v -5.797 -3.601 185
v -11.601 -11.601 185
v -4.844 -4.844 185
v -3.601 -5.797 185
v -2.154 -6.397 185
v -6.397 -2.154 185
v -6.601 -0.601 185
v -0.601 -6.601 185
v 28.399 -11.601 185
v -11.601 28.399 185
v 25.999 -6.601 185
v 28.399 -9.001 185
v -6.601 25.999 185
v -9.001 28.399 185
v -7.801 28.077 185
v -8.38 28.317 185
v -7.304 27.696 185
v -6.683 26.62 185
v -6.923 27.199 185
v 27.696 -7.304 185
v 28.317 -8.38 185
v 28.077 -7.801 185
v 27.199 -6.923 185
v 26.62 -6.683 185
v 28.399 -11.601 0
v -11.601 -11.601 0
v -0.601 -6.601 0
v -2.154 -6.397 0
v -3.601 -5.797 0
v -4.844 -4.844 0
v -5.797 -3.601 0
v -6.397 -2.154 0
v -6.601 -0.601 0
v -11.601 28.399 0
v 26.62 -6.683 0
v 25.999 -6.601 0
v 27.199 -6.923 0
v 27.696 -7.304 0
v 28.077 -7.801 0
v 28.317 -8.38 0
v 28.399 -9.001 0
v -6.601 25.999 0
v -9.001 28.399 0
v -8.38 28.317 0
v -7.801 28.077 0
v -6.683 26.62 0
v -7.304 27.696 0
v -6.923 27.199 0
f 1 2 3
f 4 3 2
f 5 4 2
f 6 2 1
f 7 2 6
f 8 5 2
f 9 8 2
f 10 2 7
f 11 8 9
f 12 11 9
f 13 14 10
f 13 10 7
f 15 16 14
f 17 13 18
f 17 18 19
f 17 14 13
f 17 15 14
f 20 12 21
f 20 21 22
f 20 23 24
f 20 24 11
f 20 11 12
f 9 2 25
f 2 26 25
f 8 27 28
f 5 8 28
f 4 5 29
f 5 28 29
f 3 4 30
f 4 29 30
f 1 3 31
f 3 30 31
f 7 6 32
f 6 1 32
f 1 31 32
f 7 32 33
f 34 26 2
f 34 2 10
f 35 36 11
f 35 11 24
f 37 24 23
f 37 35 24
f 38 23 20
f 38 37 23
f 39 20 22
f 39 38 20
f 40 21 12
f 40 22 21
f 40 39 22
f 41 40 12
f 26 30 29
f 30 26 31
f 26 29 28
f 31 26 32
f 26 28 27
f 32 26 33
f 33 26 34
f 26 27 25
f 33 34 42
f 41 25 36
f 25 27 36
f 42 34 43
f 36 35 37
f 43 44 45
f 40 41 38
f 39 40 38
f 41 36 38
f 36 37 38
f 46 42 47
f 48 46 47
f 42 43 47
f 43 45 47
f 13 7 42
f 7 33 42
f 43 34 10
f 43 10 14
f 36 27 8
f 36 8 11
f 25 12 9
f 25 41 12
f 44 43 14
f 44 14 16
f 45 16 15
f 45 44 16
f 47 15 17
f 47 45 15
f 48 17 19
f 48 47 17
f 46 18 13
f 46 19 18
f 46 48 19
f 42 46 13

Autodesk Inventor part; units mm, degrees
ref_plane "YZ Plane" through (0, 0, 0) normal (1, 0, 0) x (0, 1, 0)
ref_plane "Start Plane" through (0, 0, 0) normal (0, 0, 1) x (1, 0, 0)
ref_plane "End Plane" through (0, 0, 185) normal (0, 0, 1) x (1, 0, 0)
sketch "Sketch" plane through (0, 0, 0) normal (0, 0, 1) x (1, 0, 0)
  line L0 (-6.6013, -0.6013) -> (-6.6013, 25.9987)
  line L1 (-11.6013, 28.3987) -> (-9.0013, 28.3987)
  line L2 (-11.6013, -11.6013) -> (-11.6013, 28.3987)
  line L3 (-11.6013, -11.6013) -> (28.3987, -11.6013)
  line L4 (28.3987, -9.0013) -> (28.3987, -11.6013)
  line L5 (-0.6013, -6.6013) -> (25.9987, -6.6013)
  arc A0 (-6.6013, -0.6013) -> (-0.6013, -6.6013) centre (-0.6013, -0.6013) ccw
  arc A1 (-6.6013, 25.9987) -> (-9.0013, 28.3987) centre (-9.0013, 25.9987) ccw
  arc A2 (28.3987, -9.0013) -> (25.9987, -6.6013) centre (25.9987, -9.0013) ccw
  line L6 (0, 36.9952) -> (0, -19.7007) construction
  line L7 (-19.7007, 0) -> (36.9952, 0) construction
  point P0 (-6.6013, -6.6013)
  point P1 (-6.6013, 28.3987)
  point P2 (28.3987, -6.6013)
  dimension "d4" = 40
  dimension "d6" = 40
  dimension "d8" = 5
  dimension "d10" = 5
  dimension "d17" = 6
  dimension "d18" = 2.4
  dimension "d19" = 11.6013
  dimension "d20" = 11.6013
extrude "Body" add sketch "Sketch" along normal up to surface (185 mm away) from surface at 0
sketch "Sketch3" plane through (0, 0, 0) normal (0, 0, 1) x (1, 0, 0)
  line L0 (0, 0) -> (10, 0)
ref_plane "Work Plane10" through (0, 0, 0) normal (0, -1, 0) x (1, 0, 0)
sketch "Sketch4" plane through (0, 0, 0) normal (0, -1, 0) x (1, 0, 0)
  line L0 (-2, 0) -> (12, 0)
  line L1 (-2, 185) -> (12, 185)
  dimension "d24" = 185
equation "\"d4\" = b"
equation "\"d6\" = b"
equation "\"d8\" = ParT"
equation "\"d10\" = ParT"
equation "\"d17\" = R"
equation "\"d18\" = R1"
equation "\"d19\" = ex"
equation "\"d20\" = d19"
equation "\"d11\" = G_L"
equation "\"b\" = 40"
equation "\"ParT\" = 5"
equation "\"R\" = 6"
equation "\"R1\" = 2.4"
equation "\"G_L\" = d24"
equation "\"G_OFFSET_START\" = 0"
equation "\"G_OFFSET_END\" = 0"
equation "\"d22\" = G_OFFSET_END + B_L"
equation "\"B_L\" = 185"
equation "\"ex\" = 11.601307"
properties part number "BS 4848 - 40x40x5-185" material "Steel, Mild"
